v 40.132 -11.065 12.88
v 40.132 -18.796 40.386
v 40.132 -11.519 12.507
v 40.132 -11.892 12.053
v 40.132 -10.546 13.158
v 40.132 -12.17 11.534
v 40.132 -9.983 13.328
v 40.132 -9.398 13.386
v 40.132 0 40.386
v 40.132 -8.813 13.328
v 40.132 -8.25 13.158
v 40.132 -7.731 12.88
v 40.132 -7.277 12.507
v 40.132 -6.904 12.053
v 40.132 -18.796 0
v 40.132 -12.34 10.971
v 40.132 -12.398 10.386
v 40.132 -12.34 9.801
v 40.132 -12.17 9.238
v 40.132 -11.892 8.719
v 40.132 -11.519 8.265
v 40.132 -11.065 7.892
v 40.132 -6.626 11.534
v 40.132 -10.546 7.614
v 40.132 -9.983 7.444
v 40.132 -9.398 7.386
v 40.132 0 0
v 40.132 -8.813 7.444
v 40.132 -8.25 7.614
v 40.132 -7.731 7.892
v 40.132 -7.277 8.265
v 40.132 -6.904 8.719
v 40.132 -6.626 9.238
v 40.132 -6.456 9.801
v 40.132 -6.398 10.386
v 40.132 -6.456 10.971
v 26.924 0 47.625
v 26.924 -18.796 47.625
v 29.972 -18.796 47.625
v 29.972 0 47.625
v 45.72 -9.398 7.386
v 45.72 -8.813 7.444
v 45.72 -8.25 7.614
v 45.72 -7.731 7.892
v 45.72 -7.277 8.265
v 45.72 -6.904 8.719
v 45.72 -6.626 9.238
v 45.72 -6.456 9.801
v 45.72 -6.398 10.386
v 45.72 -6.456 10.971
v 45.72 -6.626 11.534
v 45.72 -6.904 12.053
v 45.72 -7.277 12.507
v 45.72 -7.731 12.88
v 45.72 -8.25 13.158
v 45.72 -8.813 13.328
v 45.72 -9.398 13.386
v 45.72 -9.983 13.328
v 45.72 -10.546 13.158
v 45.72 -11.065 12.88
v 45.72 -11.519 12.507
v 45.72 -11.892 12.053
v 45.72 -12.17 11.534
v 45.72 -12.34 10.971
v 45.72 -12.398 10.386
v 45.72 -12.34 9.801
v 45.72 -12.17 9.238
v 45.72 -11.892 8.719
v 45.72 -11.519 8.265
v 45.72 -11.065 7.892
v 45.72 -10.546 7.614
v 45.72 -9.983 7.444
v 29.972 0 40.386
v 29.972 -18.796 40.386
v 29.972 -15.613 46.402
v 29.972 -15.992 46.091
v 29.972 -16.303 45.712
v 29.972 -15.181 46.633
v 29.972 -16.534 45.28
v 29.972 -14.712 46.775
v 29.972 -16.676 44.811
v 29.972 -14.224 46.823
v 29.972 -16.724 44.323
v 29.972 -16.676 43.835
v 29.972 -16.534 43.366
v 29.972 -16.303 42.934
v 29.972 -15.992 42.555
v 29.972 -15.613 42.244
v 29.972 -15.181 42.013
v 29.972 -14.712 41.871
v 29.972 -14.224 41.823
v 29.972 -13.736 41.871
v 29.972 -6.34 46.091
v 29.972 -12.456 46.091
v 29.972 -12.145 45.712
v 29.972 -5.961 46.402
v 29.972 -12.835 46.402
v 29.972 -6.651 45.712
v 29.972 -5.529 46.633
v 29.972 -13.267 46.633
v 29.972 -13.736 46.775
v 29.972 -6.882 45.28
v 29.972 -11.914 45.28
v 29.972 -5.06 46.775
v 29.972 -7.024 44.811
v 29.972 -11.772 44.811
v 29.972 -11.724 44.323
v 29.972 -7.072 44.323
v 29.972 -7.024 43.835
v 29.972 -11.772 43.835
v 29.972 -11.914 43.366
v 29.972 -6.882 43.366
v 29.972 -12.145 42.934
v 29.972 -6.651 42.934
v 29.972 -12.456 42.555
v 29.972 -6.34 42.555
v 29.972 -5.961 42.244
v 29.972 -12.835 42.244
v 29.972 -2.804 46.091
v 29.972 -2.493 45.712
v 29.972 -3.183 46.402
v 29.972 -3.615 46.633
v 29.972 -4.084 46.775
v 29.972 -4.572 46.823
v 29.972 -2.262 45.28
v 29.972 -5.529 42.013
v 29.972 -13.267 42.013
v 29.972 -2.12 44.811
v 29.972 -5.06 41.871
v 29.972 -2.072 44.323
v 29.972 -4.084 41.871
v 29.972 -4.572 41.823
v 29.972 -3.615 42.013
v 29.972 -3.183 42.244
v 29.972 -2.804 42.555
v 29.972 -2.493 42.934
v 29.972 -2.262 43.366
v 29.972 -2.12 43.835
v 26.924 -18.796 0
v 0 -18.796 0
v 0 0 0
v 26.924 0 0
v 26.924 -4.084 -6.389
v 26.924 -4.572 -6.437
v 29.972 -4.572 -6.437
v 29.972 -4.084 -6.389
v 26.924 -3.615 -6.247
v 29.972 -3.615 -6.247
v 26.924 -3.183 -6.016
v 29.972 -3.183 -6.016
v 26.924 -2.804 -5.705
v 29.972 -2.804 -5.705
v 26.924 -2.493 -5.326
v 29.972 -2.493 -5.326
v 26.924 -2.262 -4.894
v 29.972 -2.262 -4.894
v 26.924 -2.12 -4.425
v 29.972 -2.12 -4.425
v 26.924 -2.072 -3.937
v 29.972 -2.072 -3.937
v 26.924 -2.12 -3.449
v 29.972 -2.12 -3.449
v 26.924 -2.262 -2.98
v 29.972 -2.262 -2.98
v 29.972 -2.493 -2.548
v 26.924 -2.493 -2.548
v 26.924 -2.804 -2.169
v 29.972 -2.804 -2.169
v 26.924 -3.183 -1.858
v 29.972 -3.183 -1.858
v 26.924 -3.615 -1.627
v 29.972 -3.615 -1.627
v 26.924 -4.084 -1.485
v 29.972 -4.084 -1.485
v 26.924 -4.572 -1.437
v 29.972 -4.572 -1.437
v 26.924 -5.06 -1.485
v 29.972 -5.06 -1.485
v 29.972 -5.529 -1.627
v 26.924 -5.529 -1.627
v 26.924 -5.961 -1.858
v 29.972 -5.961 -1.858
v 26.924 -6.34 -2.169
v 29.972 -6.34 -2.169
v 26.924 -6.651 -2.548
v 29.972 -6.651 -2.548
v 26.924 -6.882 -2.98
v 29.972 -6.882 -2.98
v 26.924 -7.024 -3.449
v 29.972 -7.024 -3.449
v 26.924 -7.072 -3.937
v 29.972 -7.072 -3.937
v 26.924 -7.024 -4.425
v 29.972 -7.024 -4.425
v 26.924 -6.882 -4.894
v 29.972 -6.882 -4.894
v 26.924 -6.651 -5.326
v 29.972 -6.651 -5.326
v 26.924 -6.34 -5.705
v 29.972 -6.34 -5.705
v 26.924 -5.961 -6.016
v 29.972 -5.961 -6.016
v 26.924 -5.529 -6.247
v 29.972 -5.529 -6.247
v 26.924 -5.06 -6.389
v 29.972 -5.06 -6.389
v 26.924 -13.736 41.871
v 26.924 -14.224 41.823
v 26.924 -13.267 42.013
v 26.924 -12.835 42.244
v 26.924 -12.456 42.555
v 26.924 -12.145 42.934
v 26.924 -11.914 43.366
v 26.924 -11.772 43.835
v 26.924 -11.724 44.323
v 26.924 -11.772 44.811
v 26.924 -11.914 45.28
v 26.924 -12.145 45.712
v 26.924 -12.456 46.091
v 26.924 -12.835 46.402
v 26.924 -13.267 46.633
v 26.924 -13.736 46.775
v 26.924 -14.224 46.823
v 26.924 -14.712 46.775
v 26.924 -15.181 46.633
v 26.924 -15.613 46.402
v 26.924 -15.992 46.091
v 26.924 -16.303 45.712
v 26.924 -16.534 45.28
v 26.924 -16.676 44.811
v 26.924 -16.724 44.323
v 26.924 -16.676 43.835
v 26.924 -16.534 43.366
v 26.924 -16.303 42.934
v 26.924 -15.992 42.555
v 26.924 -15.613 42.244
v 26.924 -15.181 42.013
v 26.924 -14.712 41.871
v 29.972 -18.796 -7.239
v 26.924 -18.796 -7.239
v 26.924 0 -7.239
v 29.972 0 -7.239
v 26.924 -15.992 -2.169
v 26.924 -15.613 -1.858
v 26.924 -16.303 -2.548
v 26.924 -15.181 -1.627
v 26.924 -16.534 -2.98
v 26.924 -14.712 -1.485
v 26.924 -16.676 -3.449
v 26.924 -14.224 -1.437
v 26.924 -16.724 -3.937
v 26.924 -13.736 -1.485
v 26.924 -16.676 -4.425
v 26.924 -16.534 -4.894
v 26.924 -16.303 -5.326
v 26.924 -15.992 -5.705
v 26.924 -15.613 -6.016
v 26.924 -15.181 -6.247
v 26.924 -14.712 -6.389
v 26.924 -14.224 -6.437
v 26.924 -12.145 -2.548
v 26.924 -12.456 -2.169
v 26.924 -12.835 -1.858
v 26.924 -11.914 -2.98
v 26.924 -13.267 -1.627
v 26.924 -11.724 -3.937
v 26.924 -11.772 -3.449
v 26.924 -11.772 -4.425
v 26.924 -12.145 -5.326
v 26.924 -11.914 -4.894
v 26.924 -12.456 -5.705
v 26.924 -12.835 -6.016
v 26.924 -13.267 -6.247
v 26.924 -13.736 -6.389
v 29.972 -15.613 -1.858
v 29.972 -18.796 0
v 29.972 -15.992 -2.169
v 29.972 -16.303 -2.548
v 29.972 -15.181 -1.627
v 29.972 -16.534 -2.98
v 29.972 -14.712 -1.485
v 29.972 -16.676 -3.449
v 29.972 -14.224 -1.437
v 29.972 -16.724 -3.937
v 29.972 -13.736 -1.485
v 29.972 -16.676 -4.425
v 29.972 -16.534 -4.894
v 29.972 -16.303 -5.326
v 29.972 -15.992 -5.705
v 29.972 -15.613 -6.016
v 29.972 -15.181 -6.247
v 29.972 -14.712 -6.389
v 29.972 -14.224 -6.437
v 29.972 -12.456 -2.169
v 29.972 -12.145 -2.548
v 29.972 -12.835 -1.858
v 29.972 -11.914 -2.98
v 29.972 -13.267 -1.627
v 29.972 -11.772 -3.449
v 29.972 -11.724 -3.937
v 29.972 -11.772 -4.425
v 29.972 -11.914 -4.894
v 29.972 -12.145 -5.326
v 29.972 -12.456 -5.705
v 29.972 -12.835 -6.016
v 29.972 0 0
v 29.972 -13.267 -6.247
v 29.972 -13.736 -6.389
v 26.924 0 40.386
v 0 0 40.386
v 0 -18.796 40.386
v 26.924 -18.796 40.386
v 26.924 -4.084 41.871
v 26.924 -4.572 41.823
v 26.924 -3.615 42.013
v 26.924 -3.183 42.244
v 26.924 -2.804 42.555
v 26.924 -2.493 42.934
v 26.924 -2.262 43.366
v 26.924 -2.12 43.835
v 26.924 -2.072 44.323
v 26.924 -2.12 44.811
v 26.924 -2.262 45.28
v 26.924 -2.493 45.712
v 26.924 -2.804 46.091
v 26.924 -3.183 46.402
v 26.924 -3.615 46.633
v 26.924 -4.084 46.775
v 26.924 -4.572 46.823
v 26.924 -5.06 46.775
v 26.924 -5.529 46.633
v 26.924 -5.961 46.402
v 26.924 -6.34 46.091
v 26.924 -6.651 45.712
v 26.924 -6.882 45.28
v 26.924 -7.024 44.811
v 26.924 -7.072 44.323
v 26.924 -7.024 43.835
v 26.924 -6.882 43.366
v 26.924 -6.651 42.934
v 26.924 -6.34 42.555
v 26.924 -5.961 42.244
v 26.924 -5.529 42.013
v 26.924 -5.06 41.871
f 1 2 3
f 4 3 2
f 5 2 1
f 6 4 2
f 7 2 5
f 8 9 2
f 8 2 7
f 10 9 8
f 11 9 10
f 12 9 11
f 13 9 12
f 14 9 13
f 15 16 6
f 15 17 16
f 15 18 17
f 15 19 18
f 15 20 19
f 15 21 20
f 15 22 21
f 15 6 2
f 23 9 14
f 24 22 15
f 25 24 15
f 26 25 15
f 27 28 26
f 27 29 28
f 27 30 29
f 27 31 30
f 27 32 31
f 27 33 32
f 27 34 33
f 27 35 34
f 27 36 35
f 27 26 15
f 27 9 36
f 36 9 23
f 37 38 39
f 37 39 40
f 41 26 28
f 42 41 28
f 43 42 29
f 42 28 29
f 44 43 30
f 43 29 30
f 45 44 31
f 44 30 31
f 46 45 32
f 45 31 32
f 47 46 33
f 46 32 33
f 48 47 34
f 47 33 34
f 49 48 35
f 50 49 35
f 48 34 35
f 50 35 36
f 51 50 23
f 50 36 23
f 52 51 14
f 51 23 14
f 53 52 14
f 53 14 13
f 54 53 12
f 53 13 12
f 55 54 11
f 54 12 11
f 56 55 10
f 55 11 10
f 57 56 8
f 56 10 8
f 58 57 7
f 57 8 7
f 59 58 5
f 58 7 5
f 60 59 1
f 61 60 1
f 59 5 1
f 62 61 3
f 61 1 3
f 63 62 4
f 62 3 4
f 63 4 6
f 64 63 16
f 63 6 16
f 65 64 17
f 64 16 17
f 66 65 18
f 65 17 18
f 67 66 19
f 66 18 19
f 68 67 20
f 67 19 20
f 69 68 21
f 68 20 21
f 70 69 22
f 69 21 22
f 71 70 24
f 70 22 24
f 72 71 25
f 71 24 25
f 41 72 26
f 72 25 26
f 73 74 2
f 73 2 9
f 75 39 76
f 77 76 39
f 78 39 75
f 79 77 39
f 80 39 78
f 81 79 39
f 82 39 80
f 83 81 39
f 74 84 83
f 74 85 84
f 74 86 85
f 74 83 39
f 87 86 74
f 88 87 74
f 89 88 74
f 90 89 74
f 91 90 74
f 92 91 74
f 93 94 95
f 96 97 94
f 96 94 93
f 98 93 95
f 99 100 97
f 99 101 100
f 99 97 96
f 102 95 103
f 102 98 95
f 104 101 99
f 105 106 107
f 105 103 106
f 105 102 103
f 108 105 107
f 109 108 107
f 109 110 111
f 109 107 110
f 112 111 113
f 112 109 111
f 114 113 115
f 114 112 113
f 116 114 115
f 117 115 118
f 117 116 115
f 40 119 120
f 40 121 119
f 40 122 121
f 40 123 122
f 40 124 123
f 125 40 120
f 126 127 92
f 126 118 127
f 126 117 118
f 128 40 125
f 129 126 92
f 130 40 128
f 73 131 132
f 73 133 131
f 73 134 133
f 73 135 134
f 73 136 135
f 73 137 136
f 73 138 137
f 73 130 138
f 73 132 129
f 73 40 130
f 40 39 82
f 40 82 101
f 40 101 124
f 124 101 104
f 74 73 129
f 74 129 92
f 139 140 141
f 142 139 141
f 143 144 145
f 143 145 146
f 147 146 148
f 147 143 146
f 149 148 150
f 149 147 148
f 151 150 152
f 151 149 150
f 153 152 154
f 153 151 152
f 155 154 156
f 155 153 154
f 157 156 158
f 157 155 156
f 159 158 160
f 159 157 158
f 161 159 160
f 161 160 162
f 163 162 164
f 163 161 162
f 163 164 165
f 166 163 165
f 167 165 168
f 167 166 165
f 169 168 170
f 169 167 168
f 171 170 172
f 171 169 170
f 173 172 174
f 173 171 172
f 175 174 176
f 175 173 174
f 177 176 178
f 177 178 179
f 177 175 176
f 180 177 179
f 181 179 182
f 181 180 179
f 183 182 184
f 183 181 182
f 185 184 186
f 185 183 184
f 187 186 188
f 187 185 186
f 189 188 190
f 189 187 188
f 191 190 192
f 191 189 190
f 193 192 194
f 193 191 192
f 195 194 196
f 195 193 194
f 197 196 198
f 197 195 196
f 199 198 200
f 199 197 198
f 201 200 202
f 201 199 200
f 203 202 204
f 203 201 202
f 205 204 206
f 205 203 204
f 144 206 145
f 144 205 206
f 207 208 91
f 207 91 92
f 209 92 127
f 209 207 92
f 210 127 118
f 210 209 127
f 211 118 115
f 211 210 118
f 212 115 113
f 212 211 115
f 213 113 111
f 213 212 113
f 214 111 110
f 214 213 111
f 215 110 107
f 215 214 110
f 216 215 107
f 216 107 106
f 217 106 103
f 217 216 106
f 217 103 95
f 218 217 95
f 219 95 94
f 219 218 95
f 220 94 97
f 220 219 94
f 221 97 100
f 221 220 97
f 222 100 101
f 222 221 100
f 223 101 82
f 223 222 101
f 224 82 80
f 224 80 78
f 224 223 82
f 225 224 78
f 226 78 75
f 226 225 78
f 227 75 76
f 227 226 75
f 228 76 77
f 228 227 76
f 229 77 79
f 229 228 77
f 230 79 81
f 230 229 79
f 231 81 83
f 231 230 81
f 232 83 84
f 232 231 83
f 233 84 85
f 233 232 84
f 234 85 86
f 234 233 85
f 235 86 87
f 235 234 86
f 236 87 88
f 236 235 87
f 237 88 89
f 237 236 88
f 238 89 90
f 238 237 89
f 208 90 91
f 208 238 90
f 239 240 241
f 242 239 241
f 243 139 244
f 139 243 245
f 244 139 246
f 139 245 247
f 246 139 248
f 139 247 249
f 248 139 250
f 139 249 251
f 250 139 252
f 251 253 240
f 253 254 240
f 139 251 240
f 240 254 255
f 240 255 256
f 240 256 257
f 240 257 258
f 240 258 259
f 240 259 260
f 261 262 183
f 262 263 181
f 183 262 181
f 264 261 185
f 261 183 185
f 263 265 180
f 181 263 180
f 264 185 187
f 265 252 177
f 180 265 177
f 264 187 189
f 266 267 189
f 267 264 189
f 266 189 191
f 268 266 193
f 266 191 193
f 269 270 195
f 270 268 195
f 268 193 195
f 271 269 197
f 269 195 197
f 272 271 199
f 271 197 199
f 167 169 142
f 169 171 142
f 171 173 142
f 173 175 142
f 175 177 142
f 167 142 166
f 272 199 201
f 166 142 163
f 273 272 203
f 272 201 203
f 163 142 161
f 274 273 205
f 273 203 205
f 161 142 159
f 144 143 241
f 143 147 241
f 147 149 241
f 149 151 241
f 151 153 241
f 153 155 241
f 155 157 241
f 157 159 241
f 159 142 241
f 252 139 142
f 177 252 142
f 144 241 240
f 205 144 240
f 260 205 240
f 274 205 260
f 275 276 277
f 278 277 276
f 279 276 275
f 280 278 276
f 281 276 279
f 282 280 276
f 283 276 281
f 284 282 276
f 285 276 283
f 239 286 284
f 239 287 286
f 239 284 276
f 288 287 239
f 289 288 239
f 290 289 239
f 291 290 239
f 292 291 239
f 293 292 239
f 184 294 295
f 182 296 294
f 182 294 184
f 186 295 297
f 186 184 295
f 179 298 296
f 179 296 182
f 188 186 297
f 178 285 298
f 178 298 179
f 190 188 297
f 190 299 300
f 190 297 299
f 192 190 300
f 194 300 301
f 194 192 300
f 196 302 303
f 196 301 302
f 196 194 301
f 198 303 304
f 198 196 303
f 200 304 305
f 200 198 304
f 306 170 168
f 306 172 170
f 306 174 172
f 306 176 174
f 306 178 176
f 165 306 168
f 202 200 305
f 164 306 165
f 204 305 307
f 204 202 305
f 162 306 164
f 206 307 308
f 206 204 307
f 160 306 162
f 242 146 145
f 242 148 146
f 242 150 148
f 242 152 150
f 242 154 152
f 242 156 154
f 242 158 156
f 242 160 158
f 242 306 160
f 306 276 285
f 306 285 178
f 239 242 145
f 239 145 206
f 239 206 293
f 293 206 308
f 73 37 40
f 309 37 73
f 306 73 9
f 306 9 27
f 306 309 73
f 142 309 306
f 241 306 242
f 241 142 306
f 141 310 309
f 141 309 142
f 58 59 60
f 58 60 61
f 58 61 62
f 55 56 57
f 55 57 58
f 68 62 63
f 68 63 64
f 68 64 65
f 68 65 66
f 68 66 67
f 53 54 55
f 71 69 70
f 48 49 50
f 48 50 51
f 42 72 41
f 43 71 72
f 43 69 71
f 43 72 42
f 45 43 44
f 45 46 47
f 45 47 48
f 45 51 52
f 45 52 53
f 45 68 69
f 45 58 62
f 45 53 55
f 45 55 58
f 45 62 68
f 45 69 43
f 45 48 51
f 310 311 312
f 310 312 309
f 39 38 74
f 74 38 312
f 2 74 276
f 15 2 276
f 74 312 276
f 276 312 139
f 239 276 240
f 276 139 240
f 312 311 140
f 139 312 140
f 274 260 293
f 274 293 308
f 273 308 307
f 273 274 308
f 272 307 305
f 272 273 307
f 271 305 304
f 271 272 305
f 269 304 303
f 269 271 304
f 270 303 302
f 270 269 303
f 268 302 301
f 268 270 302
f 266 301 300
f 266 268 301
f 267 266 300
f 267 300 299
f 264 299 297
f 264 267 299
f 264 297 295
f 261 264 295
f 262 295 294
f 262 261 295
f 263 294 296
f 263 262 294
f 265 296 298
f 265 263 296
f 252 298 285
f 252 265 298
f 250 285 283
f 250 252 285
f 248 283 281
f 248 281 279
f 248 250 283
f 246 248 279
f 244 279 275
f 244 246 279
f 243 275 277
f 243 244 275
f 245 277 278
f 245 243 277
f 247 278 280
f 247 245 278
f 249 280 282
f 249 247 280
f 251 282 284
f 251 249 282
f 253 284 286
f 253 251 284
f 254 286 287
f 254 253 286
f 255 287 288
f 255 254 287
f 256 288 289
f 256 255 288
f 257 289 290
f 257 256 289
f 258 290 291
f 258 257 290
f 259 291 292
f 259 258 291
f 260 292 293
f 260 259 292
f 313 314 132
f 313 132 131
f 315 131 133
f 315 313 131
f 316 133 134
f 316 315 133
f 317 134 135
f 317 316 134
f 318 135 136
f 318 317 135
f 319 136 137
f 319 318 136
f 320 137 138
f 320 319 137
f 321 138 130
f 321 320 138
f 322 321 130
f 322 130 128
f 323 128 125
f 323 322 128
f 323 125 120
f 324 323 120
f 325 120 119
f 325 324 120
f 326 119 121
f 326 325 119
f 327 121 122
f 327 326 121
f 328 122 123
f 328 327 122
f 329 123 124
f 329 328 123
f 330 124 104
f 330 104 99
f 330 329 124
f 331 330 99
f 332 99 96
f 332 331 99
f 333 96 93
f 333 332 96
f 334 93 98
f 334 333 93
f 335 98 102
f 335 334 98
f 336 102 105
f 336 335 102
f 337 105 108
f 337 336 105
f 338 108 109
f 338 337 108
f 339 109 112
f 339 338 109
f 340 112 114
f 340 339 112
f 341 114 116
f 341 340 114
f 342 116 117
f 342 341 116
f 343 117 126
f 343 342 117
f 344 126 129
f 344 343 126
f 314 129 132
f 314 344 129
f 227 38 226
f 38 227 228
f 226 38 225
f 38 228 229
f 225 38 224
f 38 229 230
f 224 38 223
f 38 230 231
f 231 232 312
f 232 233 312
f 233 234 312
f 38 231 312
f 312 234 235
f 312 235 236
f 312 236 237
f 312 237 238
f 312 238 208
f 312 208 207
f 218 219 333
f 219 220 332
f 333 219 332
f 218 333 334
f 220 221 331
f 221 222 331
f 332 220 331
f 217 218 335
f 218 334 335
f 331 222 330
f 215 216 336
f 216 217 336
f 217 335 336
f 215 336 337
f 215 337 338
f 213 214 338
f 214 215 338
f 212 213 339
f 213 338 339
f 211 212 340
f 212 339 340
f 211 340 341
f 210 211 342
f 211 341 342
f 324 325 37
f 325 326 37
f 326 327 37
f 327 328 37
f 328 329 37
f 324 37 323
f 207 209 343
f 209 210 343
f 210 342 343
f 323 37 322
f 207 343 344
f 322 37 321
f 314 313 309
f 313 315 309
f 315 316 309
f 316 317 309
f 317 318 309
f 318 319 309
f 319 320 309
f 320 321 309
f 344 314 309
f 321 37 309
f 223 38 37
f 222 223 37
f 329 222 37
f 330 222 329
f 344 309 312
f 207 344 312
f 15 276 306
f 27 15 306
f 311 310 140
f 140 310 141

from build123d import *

# Parameters (mm, degrees)
SKETCH1_W           = 40.386
SKETCH1_H           = 18.796
BOSS_EXTRUDE1_DEPTH = 40.132
SKETCH2_W           = 7.239
SKETCH2_H           = 18.796
SKETCH2_R           = 2.5
BOSS_EXTRUDE2_DEPTH = 3.048
SKETCH3_R           = 3
BOSS_EXTRUDE3_DEPTH = 5.588


with BuildPart() as part:
    # Sketch1 → Boss-Extrude1 (new body)
    with BuildSketch(Plane(origin=(0, 0, 0), x_dir=(0, 0, -1), z_dir=(1, 0, 0))):
        with Locations((-20.193, -9.398)):
            Rectangle(SKETCH1_W, SKETCH1_H)
    extrude(amount=BOSS_EXTRUDE1_DEPTH)

    # Sketch2 → Boss-Extrude2 (add)
    with BuildSketch(Plane(origin=(26.924, 0, 0), x_dir=(0, 0, -1), z_dir=(1, 0, 0))):
        with Locations((-44.0055, -9.398)):
            Rectangle(SKETCH2_W, SKETCH2_H)
        with Locations((-44.323, -4.572)):
            Circle(SKETCH2_R, mode=Mode.SUBTRACT)
        with Locations((-44.323, -14.224)):
            Circle(SKETCH2_R, mode=Mode.SUBTRACT)
        with Locations((3.6195, -9.398)):
            Rectangle(SKETCH2_W, SKETCH2_H)
        with Locations((3.937, -4.572)):
            Circle(SKETCH2_R, mode=Mode.SUBTRACT)
        with Locations((3.937, -14.224)):
            Circle(SKETCH2_R, mode=Mode.SUBTRACT)
    extrude(amount=BOSS_EXTRUDE2_DEPTH)

    # Sketch3 → Boss-Extrude3 (add)
    with BuildSketch(Plane(origin=(40.132, 0, 0), x_dir=(0, 0, -1), z_dir=(1, 0, 0))):
        with Locations((-10.386, -9.398)):
            Circle(SKETCH3_R)
    extrude(amount=BOSS_EXTRUDE3_DEPTH)


solid = part.part
